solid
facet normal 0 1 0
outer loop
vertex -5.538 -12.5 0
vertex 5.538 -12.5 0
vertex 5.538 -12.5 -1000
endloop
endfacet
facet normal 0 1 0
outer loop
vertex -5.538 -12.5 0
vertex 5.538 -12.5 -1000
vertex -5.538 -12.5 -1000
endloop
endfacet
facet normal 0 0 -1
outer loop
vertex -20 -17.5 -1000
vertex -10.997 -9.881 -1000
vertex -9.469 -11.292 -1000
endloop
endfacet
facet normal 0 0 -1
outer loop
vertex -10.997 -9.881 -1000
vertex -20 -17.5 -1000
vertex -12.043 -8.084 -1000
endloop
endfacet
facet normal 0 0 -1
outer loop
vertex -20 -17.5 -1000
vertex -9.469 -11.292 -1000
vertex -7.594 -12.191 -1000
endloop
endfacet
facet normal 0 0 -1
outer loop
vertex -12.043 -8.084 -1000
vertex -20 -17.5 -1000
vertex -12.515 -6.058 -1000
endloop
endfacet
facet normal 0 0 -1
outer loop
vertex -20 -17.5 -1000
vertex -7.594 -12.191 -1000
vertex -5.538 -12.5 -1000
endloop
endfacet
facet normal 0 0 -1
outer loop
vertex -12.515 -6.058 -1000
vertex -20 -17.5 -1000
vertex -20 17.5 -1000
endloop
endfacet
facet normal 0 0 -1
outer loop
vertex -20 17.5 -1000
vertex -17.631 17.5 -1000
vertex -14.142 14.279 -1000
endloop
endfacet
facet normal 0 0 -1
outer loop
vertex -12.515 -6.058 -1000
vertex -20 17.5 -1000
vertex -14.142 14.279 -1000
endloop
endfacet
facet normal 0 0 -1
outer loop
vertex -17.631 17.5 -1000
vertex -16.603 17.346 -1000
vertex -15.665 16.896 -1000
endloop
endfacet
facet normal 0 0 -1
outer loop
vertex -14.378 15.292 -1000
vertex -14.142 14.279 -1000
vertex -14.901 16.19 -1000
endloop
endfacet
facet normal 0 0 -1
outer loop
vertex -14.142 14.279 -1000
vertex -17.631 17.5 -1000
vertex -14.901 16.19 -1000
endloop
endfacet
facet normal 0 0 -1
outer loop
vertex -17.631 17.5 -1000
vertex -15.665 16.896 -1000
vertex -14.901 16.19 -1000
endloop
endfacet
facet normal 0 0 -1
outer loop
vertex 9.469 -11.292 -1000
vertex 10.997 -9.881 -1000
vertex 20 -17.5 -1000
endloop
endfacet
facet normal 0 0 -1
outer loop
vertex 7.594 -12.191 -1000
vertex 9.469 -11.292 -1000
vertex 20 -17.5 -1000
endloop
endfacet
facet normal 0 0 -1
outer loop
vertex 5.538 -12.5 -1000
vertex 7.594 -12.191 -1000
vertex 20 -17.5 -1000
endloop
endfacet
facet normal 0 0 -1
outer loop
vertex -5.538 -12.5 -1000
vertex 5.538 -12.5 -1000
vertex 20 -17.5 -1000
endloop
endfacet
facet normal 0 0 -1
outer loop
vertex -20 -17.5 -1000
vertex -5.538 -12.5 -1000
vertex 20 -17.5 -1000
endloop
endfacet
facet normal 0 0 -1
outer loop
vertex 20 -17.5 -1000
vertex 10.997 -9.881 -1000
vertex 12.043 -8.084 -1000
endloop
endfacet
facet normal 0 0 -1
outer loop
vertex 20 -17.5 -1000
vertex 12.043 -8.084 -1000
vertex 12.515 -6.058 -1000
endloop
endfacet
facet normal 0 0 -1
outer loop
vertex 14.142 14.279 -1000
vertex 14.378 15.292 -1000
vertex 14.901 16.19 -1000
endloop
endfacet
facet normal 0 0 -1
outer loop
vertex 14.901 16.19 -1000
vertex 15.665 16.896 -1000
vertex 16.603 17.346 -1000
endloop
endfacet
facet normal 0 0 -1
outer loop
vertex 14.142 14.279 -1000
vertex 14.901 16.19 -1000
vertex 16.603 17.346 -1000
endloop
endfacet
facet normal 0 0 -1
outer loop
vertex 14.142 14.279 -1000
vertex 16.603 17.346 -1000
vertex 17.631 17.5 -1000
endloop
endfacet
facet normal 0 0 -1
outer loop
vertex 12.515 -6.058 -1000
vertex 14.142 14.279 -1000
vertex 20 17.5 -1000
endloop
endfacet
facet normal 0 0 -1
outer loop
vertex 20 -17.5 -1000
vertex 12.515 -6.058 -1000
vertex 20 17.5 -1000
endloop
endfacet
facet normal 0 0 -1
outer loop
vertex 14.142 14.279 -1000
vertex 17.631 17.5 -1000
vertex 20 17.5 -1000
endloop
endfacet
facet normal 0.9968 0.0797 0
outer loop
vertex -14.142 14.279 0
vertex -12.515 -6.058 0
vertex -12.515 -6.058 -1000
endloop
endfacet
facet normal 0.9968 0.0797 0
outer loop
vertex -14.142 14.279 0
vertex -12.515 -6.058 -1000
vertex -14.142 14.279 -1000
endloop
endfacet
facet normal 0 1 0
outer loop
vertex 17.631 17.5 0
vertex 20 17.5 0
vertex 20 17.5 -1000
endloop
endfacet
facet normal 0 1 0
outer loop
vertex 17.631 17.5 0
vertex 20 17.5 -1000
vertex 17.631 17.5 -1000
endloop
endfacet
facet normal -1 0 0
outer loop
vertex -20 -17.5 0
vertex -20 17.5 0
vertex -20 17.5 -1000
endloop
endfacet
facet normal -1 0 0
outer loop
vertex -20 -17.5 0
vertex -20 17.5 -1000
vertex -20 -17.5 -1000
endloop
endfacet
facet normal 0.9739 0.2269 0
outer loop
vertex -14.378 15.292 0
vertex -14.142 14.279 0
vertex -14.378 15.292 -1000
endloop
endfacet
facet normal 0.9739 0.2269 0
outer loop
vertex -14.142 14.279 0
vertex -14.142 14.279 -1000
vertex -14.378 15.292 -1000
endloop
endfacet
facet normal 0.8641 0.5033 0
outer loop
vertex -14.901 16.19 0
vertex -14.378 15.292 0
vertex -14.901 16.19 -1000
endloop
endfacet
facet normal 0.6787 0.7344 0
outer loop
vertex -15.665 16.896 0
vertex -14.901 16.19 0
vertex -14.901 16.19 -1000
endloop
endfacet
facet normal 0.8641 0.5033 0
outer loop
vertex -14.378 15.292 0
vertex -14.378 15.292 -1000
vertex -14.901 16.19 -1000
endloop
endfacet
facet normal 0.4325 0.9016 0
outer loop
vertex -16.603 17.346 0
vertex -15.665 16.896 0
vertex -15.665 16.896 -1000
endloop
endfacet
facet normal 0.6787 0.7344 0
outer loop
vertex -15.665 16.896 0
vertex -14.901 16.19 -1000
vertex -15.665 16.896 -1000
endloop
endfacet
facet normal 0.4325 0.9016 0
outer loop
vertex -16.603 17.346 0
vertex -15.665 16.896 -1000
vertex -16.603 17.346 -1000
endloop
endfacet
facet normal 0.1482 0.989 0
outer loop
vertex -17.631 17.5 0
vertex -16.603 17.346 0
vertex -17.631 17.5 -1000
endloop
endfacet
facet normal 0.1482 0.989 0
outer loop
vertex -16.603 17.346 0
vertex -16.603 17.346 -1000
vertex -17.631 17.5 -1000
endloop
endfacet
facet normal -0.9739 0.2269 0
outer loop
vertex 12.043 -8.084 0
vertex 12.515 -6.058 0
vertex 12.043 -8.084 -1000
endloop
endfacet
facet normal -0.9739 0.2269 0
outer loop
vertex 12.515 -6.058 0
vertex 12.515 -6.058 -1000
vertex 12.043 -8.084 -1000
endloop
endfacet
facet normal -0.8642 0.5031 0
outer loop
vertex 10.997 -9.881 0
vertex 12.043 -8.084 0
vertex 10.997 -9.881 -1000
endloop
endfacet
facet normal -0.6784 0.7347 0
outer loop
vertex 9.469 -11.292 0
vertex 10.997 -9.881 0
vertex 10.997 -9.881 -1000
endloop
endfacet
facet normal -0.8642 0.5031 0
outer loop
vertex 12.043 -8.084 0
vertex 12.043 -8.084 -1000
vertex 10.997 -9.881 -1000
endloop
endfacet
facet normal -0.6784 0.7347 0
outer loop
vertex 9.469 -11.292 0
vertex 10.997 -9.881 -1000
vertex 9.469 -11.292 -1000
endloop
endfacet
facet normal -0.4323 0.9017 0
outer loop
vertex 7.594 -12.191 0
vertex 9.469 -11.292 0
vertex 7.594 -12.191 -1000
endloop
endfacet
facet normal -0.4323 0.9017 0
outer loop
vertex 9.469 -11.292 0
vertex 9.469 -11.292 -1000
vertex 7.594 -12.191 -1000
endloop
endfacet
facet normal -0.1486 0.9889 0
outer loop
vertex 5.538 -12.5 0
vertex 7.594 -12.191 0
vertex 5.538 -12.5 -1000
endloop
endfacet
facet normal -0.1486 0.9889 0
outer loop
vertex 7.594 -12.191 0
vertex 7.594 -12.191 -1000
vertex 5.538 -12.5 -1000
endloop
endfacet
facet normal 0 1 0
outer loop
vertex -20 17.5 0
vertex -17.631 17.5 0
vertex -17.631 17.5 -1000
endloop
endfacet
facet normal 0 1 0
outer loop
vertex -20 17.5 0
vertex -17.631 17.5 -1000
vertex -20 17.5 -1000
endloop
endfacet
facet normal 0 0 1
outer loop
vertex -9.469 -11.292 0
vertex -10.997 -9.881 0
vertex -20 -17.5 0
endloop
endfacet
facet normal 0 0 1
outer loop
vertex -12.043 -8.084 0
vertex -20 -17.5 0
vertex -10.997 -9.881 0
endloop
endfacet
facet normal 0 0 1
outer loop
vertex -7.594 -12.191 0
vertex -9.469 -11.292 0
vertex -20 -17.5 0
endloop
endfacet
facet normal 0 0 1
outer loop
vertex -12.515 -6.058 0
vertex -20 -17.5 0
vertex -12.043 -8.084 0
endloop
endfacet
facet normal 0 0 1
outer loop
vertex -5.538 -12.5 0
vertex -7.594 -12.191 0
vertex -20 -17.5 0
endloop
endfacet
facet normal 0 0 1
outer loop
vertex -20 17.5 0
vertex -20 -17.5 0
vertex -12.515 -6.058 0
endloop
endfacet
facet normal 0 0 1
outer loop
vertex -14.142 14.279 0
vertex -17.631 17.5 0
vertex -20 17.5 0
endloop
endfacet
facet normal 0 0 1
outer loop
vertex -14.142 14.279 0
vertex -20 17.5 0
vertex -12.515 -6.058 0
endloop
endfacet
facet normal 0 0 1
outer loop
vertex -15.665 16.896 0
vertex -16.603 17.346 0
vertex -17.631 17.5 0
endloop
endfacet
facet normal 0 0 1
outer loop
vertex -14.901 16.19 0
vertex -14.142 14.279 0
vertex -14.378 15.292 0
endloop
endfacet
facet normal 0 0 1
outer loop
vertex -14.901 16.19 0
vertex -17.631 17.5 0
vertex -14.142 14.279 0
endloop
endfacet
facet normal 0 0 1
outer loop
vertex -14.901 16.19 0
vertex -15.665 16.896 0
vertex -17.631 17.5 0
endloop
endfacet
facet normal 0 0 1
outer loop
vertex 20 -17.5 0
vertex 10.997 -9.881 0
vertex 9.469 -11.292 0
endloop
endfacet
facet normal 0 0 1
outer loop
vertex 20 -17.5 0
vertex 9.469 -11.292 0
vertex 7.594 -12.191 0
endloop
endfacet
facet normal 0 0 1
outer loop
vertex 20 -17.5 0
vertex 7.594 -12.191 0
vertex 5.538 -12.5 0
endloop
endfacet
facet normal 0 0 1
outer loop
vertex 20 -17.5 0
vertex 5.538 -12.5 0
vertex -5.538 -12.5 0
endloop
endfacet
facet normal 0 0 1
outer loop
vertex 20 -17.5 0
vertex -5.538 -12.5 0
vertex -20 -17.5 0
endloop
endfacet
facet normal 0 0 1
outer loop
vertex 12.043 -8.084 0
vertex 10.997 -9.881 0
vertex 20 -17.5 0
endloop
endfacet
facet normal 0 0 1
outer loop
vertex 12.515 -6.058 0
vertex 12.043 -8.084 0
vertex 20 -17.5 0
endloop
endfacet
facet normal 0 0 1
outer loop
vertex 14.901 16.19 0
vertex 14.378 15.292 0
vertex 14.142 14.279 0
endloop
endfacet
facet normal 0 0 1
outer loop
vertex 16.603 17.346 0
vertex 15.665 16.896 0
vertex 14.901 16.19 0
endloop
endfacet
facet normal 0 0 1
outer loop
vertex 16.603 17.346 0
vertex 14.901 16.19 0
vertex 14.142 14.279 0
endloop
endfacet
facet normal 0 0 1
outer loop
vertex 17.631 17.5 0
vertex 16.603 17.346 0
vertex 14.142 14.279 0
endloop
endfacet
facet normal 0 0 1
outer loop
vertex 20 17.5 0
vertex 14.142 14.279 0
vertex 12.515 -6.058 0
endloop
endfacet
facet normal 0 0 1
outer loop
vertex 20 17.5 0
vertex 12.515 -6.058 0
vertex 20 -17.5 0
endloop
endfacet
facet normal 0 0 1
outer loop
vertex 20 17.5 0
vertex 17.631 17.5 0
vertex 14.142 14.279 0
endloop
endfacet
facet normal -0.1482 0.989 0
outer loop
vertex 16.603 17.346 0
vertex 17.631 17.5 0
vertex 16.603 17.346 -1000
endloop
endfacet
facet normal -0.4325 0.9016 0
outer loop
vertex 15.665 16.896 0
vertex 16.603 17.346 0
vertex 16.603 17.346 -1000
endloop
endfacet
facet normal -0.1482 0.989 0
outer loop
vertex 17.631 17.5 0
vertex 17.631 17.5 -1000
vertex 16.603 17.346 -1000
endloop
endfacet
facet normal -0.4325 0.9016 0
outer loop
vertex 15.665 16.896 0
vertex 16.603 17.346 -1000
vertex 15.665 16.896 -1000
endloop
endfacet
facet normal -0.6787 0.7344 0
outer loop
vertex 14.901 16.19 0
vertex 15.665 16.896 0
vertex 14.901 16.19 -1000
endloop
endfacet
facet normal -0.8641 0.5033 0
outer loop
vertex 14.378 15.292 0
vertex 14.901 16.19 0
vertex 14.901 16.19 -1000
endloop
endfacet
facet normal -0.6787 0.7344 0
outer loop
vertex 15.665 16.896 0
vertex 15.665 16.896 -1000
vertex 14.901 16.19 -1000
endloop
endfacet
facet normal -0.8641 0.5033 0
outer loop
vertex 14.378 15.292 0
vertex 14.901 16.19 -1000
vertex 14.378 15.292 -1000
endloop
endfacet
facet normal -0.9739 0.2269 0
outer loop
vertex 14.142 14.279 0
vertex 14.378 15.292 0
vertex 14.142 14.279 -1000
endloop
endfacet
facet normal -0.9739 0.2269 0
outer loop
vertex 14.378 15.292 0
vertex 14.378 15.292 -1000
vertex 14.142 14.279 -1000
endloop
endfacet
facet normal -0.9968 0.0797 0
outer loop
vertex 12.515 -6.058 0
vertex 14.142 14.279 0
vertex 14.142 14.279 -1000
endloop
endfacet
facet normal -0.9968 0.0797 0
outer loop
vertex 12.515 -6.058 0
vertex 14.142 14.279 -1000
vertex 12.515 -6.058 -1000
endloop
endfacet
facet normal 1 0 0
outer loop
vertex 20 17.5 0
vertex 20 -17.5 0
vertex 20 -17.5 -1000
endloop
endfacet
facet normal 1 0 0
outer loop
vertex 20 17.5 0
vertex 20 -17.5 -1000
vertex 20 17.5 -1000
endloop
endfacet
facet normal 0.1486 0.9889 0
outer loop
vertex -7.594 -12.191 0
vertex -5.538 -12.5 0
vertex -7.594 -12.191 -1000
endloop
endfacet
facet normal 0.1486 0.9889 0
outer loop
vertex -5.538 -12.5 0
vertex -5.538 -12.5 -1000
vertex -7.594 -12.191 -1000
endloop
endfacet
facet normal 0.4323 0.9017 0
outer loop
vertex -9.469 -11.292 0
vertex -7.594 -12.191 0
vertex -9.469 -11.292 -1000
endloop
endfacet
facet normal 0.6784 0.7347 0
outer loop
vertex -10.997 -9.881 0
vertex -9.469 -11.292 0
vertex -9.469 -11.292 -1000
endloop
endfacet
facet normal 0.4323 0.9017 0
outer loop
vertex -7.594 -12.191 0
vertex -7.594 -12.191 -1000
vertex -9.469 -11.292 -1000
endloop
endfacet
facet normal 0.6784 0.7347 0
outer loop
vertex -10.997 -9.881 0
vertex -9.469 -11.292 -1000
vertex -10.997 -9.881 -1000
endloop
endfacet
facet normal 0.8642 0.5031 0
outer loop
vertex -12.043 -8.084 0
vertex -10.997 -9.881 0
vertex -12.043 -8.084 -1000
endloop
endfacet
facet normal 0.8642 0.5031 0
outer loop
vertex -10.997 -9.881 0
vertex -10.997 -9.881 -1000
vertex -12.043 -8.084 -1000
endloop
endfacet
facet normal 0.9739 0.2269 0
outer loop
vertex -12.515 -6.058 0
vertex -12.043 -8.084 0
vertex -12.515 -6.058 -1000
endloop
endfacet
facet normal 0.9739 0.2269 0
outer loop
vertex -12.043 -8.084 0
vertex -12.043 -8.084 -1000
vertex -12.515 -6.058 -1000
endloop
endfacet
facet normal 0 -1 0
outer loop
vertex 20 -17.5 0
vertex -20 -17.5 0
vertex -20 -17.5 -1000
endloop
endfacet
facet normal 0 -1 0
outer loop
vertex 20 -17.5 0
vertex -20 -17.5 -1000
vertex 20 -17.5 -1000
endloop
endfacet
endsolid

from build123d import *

# Parameters (mm, degrees)
F1_DEPTH = 1000
F2_R     = 3.5
F3_R     = 7


with BuildPart() as f1:
    # F0 (on Top) → F1 (new body)
    with BuildSketch(Plane.XY):
        Polygon((-20, 17.5), (-20, -17.5), (20, -17.5), (20, 17.5), (14.400024, 17.5), (11.999983, -12.5), (-11.999983, -12.5), (-14.400024, 17.5), align=None)
    extrude(amount=-F1_DEPTH)

    # F2
    f2_edges = [f1.edges().sort_by_distance(p)[0] for p in [
        (-14.400024, 17.5, -500),
        (14.400024, 17.5, -500),
    ]]
    fillet(f2_edges, radius=F2_R)

    # F3
    f3_edges = [f1.edges().sort_by_distance(p)[0] for p in [
        (-11.999983, -12.5, -500),
        (11.999983, -12.5, -500),
    ]]
    fillet(f3_edges, radius=F3_R)


solid = f1.part
